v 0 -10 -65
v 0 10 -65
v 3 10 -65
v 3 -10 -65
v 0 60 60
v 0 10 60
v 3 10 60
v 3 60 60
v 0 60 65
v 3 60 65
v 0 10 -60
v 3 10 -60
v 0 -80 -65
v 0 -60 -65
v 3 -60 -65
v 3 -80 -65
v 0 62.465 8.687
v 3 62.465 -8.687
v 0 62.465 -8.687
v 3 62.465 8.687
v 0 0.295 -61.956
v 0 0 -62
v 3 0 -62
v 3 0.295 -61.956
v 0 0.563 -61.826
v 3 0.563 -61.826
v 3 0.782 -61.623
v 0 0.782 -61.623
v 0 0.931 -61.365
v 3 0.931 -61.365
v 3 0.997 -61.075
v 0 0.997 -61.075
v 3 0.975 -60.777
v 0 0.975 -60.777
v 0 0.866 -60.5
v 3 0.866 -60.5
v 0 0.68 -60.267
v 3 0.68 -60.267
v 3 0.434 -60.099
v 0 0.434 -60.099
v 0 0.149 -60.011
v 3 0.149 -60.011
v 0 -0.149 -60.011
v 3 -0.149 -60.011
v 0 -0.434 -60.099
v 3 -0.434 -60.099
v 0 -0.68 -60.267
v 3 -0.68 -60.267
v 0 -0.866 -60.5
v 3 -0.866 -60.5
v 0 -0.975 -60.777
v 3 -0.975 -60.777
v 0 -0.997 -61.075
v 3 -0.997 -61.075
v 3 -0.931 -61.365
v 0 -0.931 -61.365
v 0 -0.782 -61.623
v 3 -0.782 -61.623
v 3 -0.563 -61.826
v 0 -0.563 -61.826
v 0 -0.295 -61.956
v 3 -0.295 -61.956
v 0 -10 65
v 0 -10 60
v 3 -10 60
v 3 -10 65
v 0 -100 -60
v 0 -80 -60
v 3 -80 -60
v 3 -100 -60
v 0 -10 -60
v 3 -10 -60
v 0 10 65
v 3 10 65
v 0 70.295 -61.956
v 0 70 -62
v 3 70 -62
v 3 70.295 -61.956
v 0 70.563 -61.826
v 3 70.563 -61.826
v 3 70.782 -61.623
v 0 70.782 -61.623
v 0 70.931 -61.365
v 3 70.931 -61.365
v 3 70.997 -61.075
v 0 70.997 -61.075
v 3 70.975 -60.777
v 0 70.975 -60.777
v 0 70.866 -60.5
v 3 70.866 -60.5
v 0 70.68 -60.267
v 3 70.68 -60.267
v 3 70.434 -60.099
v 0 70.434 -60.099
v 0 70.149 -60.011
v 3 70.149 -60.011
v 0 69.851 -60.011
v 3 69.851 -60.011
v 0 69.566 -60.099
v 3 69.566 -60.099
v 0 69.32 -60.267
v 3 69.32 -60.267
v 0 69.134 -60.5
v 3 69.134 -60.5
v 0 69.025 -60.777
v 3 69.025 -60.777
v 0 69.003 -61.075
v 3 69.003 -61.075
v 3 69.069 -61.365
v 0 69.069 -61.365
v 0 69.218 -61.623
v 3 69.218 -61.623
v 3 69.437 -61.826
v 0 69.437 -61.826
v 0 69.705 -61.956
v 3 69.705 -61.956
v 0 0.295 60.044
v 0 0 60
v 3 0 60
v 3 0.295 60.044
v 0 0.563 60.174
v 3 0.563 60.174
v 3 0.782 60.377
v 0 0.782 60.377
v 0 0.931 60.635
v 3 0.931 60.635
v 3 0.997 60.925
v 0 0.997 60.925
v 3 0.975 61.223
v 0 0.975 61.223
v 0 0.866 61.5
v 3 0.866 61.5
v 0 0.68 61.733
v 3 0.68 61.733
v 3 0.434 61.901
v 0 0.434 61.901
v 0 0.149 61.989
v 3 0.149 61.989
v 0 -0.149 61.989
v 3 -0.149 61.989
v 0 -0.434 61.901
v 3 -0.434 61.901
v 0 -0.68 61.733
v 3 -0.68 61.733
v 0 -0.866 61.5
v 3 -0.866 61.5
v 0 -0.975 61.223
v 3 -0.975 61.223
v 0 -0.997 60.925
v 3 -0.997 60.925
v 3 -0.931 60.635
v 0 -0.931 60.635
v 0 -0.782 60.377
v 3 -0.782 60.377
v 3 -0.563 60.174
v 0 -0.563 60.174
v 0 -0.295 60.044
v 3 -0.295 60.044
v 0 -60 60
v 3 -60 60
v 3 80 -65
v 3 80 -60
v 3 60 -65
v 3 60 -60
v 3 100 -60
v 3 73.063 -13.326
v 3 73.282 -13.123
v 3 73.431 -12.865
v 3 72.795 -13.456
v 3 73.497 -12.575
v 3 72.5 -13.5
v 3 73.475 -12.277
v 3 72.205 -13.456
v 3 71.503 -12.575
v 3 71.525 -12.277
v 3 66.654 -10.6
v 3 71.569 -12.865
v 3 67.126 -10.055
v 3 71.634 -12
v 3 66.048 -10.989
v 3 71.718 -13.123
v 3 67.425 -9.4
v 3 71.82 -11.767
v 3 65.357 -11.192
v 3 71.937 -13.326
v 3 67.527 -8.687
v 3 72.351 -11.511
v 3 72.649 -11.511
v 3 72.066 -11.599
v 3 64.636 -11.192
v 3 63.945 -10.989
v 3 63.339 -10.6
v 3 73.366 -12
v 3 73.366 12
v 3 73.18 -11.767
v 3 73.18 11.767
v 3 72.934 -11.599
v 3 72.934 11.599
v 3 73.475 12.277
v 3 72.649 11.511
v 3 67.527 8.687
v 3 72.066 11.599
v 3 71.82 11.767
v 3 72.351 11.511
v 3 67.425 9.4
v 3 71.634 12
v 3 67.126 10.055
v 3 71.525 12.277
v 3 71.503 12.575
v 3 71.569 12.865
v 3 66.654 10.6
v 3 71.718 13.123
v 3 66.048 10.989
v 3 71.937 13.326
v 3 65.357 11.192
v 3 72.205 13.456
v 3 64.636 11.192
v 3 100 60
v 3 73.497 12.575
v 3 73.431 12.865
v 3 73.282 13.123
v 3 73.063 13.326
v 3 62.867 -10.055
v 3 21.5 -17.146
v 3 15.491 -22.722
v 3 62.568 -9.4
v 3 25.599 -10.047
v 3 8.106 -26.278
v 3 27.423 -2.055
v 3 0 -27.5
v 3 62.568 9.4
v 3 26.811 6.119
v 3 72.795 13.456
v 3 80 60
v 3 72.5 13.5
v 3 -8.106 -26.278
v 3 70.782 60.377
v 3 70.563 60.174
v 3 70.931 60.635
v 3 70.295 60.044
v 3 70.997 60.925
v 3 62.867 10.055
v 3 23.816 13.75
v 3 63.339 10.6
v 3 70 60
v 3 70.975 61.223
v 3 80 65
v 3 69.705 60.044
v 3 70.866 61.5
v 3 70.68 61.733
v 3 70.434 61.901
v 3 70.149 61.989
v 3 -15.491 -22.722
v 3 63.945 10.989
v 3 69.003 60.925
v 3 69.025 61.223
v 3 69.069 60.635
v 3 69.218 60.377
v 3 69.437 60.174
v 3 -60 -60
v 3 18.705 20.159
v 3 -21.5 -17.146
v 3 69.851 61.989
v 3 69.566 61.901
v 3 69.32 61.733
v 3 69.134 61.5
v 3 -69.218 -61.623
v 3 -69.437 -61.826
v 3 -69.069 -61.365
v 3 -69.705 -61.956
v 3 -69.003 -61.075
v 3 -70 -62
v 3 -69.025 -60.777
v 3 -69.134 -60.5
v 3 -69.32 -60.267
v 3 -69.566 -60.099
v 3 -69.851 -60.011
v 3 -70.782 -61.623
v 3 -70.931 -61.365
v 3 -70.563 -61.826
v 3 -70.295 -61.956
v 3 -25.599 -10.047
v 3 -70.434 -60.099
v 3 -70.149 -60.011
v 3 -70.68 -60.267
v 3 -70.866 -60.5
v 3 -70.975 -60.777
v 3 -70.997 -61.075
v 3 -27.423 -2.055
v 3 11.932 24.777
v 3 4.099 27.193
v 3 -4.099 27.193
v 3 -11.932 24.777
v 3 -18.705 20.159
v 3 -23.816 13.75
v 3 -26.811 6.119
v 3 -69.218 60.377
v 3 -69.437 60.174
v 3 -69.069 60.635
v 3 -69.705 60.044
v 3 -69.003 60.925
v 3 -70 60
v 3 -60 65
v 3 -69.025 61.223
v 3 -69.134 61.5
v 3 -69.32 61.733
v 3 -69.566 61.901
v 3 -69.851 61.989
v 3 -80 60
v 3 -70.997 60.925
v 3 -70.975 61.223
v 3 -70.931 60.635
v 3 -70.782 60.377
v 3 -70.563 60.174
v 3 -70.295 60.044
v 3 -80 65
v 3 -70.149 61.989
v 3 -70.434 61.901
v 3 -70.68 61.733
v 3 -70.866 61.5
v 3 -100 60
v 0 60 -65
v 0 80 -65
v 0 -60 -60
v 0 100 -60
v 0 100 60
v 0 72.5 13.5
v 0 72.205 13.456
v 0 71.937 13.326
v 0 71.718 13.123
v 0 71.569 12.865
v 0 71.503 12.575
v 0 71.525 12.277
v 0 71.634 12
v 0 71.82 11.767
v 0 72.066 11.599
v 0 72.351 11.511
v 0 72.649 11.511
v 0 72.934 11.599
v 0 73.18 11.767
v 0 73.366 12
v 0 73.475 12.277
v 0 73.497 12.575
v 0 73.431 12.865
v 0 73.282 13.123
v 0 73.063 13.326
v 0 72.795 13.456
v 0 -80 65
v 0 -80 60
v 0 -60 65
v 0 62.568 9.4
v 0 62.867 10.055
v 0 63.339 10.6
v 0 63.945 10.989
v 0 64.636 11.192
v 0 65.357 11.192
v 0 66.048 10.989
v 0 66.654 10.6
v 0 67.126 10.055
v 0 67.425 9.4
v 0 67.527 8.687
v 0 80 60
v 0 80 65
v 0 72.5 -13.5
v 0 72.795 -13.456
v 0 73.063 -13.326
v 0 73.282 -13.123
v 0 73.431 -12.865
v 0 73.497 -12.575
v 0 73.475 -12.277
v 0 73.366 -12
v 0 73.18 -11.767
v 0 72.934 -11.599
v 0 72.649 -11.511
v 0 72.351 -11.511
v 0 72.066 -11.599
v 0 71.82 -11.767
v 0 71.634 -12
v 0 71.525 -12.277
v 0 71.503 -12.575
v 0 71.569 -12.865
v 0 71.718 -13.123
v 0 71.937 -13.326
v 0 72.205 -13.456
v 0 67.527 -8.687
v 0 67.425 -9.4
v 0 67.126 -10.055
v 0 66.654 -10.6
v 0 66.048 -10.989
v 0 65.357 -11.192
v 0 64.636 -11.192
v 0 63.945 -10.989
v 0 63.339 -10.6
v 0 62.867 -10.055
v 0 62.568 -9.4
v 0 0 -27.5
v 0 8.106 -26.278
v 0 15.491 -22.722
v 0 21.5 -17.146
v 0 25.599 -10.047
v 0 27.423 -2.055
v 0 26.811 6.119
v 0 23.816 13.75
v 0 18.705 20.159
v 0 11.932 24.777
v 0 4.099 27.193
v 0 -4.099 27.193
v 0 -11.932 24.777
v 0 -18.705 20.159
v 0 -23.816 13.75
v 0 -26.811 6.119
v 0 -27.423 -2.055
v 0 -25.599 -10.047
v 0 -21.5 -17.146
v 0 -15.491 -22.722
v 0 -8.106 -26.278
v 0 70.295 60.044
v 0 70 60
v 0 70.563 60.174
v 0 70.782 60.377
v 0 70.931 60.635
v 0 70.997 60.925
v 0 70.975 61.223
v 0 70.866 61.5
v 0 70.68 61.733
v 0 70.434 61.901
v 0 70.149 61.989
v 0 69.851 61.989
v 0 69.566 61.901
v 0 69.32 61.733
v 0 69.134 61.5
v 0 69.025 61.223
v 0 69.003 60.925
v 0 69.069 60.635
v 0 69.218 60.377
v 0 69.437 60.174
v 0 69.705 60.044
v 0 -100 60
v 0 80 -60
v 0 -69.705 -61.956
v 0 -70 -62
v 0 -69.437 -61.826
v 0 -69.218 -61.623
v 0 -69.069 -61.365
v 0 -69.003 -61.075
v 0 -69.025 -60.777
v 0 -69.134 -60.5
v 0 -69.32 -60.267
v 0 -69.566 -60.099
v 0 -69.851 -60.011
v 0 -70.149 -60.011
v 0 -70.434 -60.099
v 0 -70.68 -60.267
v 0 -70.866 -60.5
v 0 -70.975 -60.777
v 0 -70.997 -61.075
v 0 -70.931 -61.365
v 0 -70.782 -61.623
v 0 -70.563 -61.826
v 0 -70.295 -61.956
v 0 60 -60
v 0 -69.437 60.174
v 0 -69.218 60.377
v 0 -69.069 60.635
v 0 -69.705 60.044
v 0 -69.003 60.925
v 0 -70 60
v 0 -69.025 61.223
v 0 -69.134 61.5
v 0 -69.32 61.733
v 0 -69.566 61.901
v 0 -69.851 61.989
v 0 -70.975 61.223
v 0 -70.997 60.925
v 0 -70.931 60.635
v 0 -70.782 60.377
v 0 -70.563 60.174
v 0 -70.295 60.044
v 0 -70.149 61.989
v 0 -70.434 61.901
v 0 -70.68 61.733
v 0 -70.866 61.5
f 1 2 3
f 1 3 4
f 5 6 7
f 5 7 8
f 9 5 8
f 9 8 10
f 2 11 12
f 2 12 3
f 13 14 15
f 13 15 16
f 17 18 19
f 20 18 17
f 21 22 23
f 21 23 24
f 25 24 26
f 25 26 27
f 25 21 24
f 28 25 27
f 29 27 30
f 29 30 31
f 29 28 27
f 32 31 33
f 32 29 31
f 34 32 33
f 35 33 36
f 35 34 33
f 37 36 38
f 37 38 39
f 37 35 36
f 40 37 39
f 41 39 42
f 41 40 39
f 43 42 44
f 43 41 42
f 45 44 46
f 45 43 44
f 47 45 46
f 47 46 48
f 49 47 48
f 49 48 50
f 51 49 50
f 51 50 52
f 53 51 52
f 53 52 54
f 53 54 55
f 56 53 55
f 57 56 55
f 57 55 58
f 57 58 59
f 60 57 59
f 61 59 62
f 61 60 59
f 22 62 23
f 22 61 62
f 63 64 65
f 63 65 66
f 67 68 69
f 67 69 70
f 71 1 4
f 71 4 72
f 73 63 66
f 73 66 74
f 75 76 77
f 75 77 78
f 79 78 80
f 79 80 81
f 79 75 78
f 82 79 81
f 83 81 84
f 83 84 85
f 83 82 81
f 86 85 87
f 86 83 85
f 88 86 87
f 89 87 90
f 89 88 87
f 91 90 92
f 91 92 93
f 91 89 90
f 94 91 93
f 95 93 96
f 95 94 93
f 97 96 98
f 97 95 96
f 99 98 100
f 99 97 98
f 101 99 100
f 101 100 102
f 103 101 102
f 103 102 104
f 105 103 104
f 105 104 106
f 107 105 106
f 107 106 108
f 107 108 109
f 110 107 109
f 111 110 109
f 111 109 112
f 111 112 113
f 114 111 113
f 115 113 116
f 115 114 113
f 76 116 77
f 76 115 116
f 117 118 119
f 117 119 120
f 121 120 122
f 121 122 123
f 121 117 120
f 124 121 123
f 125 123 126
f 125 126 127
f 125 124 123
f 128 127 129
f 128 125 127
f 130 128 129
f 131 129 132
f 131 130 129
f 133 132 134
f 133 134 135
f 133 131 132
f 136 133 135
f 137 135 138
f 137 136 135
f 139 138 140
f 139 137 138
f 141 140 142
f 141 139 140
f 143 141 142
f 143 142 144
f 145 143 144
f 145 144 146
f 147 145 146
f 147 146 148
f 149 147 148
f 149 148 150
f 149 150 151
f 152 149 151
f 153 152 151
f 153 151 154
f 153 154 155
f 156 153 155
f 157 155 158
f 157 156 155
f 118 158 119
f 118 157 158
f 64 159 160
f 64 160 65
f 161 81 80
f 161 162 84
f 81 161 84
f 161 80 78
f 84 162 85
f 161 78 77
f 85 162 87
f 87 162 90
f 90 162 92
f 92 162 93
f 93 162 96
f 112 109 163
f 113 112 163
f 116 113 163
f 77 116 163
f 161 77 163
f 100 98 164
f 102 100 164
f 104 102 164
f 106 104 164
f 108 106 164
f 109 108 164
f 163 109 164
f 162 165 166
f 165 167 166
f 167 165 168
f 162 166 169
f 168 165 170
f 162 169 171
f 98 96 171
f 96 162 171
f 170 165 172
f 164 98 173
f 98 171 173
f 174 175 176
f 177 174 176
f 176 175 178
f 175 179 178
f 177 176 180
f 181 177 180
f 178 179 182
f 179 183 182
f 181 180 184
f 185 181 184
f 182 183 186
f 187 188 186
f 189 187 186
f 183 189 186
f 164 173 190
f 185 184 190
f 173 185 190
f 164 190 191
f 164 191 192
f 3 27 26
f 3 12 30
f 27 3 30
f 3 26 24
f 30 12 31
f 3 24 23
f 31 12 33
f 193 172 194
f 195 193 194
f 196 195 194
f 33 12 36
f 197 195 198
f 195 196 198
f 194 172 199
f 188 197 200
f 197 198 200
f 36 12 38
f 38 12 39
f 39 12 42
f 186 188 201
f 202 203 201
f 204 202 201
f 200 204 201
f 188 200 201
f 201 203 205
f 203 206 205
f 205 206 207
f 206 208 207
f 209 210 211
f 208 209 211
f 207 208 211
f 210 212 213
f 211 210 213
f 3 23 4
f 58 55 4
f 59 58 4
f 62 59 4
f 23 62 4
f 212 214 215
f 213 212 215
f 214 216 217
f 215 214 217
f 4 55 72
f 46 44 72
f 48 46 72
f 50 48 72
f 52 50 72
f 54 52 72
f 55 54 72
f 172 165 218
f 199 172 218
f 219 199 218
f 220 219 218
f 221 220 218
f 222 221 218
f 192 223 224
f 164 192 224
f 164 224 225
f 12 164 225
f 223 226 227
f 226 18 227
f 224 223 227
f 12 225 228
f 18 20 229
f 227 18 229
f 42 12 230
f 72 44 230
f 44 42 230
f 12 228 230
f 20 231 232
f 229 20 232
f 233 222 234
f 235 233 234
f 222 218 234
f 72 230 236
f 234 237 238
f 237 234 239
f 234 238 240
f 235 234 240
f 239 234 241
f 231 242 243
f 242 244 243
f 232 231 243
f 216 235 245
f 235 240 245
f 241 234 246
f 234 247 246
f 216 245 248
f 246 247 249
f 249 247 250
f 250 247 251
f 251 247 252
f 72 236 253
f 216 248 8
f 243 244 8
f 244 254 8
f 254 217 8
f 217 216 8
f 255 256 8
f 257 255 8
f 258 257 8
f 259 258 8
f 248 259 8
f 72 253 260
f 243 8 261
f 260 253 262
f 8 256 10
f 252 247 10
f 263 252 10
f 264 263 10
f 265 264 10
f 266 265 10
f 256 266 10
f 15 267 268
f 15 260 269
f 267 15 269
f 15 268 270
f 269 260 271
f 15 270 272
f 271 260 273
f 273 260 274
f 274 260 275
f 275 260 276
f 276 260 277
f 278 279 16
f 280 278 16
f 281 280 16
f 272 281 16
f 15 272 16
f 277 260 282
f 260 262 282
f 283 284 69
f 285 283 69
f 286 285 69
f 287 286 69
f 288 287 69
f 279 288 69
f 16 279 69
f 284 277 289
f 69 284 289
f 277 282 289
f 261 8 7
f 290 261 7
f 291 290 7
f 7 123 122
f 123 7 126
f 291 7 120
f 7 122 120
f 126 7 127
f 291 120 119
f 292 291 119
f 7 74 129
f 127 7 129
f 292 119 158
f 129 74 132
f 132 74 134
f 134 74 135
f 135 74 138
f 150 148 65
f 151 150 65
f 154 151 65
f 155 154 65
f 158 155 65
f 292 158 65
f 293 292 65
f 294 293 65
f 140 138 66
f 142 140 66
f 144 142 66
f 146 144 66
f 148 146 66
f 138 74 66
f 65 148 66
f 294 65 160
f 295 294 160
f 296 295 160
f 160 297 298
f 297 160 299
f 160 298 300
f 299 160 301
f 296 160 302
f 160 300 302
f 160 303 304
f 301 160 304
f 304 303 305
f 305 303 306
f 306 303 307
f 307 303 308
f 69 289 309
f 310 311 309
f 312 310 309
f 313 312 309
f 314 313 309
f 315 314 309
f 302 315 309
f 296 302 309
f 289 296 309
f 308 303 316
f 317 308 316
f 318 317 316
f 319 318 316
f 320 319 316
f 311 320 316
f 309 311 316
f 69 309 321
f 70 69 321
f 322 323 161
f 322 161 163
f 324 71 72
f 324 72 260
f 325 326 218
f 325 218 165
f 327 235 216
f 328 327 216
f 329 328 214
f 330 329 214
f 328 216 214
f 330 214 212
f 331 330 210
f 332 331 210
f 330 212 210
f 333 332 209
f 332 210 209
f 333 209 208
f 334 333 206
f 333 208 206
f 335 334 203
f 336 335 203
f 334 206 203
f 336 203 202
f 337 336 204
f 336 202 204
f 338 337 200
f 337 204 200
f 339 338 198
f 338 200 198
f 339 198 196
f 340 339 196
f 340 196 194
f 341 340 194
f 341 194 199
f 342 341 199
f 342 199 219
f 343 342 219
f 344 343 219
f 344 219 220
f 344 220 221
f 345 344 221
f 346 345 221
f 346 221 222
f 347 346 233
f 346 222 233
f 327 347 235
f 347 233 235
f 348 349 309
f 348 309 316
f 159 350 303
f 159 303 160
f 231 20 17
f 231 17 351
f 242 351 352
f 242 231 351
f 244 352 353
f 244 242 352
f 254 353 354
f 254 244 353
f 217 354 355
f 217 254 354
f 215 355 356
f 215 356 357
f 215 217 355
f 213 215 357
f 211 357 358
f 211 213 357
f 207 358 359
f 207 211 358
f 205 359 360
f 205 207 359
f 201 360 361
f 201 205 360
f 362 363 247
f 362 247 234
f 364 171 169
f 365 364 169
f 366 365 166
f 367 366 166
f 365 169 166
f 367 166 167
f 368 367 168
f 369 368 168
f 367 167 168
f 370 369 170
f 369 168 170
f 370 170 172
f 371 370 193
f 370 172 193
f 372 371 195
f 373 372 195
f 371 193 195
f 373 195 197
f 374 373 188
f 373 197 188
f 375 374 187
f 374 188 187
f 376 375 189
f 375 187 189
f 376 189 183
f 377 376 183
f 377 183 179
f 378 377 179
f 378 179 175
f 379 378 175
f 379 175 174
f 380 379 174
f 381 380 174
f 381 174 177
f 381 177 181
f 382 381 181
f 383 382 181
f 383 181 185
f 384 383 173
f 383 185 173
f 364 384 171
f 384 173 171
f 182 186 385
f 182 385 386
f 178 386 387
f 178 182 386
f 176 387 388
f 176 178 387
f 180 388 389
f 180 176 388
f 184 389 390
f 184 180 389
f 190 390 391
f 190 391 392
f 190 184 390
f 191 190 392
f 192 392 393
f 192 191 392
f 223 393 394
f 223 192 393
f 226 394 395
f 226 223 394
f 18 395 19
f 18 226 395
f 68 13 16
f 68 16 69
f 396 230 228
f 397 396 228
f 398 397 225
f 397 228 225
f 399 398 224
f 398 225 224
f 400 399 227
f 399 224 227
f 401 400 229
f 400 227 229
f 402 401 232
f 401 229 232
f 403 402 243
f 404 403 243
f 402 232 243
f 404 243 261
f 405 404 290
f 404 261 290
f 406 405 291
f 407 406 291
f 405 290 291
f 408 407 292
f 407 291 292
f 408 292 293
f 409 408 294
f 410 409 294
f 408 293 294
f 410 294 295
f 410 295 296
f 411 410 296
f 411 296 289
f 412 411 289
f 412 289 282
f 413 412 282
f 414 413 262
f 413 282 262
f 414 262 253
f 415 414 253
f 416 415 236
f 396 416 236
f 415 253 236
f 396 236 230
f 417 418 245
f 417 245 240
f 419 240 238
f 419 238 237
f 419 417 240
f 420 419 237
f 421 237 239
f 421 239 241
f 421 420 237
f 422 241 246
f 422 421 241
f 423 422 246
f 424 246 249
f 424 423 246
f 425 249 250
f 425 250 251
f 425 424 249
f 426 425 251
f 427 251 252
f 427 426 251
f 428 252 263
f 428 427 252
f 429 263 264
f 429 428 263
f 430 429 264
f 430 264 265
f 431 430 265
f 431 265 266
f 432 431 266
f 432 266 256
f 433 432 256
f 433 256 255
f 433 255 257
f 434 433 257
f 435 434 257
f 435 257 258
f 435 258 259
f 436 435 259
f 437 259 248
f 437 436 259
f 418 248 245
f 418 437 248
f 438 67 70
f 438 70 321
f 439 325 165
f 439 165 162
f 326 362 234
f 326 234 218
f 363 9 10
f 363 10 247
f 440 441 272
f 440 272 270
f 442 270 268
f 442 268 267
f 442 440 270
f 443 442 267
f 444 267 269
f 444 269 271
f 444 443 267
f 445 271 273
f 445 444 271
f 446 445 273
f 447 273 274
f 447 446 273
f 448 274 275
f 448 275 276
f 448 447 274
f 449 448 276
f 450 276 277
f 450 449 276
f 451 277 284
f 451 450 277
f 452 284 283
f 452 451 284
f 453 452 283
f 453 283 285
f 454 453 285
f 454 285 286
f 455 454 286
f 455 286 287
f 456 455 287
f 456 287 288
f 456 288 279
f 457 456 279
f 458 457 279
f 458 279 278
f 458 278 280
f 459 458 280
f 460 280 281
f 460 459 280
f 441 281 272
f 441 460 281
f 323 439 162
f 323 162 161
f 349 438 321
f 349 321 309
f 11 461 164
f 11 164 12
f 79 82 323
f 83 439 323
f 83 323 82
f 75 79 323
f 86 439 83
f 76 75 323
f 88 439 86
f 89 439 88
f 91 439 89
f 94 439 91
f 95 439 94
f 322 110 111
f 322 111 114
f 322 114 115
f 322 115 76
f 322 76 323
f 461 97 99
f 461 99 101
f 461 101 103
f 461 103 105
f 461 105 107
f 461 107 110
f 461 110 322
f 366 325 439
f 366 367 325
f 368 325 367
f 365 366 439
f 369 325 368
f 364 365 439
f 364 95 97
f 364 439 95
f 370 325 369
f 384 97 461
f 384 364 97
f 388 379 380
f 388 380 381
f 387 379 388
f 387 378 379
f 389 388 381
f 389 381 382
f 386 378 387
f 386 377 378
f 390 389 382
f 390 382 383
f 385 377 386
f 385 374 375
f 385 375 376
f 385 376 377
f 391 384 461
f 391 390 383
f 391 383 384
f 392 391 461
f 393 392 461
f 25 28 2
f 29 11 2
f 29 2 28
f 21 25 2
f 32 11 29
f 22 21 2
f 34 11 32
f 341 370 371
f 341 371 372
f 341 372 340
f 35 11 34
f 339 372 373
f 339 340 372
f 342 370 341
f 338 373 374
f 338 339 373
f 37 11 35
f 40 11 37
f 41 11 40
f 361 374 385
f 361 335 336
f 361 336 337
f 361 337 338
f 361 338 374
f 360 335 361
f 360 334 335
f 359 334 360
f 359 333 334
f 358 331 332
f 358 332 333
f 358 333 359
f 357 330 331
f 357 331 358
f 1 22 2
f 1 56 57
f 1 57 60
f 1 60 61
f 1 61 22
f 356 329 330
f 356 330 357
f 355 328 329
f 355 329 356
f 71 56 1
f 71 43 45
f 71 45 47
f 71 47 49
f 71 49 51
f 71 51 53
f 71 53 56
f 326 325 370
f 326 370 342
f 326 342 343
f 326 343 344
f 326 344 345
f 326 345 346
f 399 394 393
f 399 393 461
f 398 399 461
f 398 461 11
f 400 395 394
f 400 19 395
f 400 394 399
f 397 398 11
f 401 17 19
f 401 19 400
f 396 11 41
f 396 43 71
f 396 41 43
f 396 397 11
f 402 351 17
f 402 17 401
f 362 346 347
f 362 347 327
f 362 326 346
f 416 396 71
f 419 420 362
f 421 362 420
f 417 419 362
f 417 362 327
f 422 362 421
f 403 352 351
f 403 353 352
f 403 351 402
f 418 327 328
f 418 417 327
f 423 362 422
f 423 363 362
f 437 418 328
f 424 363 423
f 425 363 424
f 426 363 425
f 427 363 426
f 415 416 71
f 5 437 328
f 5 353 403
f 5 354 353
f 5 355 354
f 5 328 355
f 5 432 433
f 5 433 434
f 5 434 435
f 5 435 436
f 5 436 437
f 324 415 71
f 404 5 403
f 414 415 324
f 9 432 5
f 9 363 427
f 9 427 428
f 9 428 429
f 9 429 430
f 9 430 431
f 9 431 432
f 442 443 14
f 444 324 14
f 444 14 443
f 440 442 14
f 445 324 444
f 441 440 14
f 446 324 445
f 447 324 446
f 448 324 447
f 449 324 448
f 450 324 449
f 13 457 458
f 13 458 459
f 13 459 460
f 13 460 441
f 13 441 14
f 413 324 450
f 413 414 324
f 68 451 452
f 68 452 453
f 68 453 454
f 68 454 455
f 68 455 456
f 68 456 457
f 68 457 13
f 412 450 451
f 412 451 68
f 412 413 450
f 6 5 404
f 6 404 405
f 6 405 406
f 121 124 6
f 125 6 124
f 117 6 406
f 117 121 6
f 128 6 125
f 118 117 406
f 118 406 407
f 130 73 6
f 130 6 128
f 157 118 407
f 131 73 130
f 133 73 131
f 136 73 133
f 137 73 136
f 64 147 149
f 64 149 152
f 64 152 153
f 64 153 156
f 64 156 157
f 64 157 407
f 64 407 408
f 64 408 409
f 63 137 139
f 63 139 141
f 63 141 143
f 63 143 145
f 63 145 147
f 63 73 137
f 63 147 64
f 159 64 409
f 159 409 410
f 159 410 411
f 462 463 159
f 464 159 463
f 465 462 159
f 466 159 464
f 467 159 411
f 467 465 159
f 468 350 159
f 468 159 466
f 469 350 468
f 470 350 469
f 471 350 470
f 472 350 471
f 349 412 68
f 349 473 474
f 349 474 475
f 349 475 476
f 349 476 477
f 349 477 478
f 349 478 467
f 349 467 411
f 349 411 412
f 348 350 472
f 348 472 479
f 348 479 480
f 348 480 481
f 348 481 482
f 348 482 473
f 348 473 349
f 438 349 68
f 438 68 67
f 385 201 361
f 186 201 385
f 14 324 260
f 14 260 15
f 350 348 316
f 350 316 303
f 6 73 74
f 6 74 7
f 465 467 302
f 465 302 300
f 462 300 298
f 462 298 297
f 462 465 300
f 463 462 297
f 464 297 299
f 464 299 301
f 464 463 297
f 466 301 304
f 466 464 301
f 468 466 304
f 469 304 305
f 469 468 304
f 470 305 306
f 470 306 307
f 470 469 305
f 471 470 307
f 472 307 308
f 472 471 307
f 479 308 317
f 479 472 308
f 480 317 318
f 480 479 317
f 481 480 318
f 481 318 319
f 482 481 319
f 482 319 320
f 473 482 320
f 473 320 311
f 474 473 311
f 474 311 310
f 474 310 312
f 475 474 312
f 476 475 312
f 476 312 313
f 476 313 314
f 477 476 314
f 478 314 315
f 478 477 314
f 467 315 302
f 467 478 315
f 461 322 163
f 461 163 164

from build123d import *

# Parameters (mm, degrees)
SKETCH1_R           = 1
BOSS_EXTRUDE1_DEPTH = 3
SKETCH2_R           = 27.5
SKETCH2_R_2         = 1
CUT_EXTRUDE1_DEPTH  = 3


with BuildPart() as part:
    # Sketch1 → Boss-Extrude1 (new body)
    with BuildSketch(Plane.YZ):
        Polygon((-80, 60), (-80, 65), (-60, 65), (-60, 60), (-10, 60), (-10, 65), (10, 65), (10, 60), (60, 60), (60, 65), (80, 65), (80, 60), (100, 60), (100, -60), (80, -60), (80, -65), (60, -65), (60, -60), (10, -60), (10, -65), (-10, -65), (-10, -60), (-60, -60), (-60, -65), (-80, -65), (-80, -60), (-100, -60), (-100, 60), align=None)
        with Locations(Location((-70, 61, 0), (0, 0, 270))):
            Circle(SKETCH1_R, mode=Mode.SUBTRACT)
        with Locations(Location((70, 61, 0), (0, 0, 270))):
            Circle(SKETCH1_R, mode=Mode.SUBTRACT)
        with Locations(Location((0, 61, 0), (0, 0, 270))):
            Circle(SKETCH1_R, mode=Mode.SUBTRACT)
        with Locations(Location((70, -61, 0), (0, 0, 270))):
            Circle(SKETCH1_R, mode=Mode.SUBTRACT)
        with Locations(Location((0, -61, 0), (0, 0, 270))):
            Circle(SKETCH1_R, mode=Mode.SUBTRACT)
        with Locations(Location((-70, -61, 0), (0, 0, 270))):
            Circle(SKETCH1_R, mode=Mode.SUBTRACT)
    extrude(amount=BOSS_EXTRUDE1_DEPTH)

    # Sketch2 → Cut-Extrude1 (cut)
    with BuildSketch(Plane.YZ.offset(3)):
        with Locations(Location((0, 0, 0), (0, 0, 270))):
            Circle(SKETCH2_R)
        with Locations(Location((72.5, -12.5, 0), (0, 0, 270))):
            Circle(SKETCH2_R_2)
        with Locations(Location((72.5, 12.5, 0), (0, 0, 90))):
            Circle(SKETCH2_R_2)
        with BuildLine():
            Line((67.527461624, 8.686817334), (67.527461624, -8.686817334))
            ThreePointArc((67.527461624, -8.686817334), (64.996283302, -11.217995655), (62.465104981, -8.686817334))
            Line((62.465104981, -8.686817334), (62.465104981, 8.686817334))
            ThreePointArc((62.465104981, 8.686817334), (64.996283302, 11.217995655), (67.527461624, 8.686817334))
        make_face()
    extrude(amount=-CUT_EXTRUDE1_DEPTH, mode=Mode.SUBTRACT)


solid = part.part
